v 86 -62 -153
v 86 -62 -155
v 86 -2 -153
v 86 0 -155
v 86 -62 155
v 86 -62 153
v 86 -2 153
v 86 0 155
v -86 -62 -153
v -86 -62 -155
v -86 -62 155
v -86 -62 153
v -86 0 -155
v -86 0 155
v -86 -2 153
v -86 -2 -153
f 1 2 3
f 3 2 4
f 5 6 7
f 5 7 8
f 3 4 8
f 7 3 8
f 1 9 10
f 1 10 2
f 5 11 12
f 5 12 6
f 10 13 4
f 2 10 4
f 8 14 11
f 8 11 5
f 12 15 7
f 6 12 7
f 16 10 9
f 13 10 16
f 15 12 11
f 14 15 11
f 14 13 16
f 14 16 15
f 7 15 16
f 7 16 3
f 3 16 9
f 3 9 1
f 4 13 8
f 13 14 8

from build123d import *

# Parameters (mm, degrees)
F0_W     = 172
F0_H     = 306
F1_DEPTH = 2
F0_H_2   = 2
F2_DEPTH = 62
F3_DEPTH = 62


with BuildPart() as f1:
    # F0 (on Front) → F1 (new body)
    with BuildSketch(Plane.XZ):
        Rectangle(F0_W, F0_H)
    extrude(amount=F1_DEPTH)

    # F0 (on Front) → F2 (join)
    with BuildSketch(Plane.XZ):
        with Locations((0, 154)):
            Rectangle(F0_W, F0_H_2)
    extrude(amount=F2_DEPTH)

    # F0 (on Front) → F3 (join)
    with BuildSketch(Plane.XZ):
        with Locations((0, -154)):
            Rectangle(F0_W, F0_H_2)
    extrude(amount=F3_DEPTH)


solid = f1.part
